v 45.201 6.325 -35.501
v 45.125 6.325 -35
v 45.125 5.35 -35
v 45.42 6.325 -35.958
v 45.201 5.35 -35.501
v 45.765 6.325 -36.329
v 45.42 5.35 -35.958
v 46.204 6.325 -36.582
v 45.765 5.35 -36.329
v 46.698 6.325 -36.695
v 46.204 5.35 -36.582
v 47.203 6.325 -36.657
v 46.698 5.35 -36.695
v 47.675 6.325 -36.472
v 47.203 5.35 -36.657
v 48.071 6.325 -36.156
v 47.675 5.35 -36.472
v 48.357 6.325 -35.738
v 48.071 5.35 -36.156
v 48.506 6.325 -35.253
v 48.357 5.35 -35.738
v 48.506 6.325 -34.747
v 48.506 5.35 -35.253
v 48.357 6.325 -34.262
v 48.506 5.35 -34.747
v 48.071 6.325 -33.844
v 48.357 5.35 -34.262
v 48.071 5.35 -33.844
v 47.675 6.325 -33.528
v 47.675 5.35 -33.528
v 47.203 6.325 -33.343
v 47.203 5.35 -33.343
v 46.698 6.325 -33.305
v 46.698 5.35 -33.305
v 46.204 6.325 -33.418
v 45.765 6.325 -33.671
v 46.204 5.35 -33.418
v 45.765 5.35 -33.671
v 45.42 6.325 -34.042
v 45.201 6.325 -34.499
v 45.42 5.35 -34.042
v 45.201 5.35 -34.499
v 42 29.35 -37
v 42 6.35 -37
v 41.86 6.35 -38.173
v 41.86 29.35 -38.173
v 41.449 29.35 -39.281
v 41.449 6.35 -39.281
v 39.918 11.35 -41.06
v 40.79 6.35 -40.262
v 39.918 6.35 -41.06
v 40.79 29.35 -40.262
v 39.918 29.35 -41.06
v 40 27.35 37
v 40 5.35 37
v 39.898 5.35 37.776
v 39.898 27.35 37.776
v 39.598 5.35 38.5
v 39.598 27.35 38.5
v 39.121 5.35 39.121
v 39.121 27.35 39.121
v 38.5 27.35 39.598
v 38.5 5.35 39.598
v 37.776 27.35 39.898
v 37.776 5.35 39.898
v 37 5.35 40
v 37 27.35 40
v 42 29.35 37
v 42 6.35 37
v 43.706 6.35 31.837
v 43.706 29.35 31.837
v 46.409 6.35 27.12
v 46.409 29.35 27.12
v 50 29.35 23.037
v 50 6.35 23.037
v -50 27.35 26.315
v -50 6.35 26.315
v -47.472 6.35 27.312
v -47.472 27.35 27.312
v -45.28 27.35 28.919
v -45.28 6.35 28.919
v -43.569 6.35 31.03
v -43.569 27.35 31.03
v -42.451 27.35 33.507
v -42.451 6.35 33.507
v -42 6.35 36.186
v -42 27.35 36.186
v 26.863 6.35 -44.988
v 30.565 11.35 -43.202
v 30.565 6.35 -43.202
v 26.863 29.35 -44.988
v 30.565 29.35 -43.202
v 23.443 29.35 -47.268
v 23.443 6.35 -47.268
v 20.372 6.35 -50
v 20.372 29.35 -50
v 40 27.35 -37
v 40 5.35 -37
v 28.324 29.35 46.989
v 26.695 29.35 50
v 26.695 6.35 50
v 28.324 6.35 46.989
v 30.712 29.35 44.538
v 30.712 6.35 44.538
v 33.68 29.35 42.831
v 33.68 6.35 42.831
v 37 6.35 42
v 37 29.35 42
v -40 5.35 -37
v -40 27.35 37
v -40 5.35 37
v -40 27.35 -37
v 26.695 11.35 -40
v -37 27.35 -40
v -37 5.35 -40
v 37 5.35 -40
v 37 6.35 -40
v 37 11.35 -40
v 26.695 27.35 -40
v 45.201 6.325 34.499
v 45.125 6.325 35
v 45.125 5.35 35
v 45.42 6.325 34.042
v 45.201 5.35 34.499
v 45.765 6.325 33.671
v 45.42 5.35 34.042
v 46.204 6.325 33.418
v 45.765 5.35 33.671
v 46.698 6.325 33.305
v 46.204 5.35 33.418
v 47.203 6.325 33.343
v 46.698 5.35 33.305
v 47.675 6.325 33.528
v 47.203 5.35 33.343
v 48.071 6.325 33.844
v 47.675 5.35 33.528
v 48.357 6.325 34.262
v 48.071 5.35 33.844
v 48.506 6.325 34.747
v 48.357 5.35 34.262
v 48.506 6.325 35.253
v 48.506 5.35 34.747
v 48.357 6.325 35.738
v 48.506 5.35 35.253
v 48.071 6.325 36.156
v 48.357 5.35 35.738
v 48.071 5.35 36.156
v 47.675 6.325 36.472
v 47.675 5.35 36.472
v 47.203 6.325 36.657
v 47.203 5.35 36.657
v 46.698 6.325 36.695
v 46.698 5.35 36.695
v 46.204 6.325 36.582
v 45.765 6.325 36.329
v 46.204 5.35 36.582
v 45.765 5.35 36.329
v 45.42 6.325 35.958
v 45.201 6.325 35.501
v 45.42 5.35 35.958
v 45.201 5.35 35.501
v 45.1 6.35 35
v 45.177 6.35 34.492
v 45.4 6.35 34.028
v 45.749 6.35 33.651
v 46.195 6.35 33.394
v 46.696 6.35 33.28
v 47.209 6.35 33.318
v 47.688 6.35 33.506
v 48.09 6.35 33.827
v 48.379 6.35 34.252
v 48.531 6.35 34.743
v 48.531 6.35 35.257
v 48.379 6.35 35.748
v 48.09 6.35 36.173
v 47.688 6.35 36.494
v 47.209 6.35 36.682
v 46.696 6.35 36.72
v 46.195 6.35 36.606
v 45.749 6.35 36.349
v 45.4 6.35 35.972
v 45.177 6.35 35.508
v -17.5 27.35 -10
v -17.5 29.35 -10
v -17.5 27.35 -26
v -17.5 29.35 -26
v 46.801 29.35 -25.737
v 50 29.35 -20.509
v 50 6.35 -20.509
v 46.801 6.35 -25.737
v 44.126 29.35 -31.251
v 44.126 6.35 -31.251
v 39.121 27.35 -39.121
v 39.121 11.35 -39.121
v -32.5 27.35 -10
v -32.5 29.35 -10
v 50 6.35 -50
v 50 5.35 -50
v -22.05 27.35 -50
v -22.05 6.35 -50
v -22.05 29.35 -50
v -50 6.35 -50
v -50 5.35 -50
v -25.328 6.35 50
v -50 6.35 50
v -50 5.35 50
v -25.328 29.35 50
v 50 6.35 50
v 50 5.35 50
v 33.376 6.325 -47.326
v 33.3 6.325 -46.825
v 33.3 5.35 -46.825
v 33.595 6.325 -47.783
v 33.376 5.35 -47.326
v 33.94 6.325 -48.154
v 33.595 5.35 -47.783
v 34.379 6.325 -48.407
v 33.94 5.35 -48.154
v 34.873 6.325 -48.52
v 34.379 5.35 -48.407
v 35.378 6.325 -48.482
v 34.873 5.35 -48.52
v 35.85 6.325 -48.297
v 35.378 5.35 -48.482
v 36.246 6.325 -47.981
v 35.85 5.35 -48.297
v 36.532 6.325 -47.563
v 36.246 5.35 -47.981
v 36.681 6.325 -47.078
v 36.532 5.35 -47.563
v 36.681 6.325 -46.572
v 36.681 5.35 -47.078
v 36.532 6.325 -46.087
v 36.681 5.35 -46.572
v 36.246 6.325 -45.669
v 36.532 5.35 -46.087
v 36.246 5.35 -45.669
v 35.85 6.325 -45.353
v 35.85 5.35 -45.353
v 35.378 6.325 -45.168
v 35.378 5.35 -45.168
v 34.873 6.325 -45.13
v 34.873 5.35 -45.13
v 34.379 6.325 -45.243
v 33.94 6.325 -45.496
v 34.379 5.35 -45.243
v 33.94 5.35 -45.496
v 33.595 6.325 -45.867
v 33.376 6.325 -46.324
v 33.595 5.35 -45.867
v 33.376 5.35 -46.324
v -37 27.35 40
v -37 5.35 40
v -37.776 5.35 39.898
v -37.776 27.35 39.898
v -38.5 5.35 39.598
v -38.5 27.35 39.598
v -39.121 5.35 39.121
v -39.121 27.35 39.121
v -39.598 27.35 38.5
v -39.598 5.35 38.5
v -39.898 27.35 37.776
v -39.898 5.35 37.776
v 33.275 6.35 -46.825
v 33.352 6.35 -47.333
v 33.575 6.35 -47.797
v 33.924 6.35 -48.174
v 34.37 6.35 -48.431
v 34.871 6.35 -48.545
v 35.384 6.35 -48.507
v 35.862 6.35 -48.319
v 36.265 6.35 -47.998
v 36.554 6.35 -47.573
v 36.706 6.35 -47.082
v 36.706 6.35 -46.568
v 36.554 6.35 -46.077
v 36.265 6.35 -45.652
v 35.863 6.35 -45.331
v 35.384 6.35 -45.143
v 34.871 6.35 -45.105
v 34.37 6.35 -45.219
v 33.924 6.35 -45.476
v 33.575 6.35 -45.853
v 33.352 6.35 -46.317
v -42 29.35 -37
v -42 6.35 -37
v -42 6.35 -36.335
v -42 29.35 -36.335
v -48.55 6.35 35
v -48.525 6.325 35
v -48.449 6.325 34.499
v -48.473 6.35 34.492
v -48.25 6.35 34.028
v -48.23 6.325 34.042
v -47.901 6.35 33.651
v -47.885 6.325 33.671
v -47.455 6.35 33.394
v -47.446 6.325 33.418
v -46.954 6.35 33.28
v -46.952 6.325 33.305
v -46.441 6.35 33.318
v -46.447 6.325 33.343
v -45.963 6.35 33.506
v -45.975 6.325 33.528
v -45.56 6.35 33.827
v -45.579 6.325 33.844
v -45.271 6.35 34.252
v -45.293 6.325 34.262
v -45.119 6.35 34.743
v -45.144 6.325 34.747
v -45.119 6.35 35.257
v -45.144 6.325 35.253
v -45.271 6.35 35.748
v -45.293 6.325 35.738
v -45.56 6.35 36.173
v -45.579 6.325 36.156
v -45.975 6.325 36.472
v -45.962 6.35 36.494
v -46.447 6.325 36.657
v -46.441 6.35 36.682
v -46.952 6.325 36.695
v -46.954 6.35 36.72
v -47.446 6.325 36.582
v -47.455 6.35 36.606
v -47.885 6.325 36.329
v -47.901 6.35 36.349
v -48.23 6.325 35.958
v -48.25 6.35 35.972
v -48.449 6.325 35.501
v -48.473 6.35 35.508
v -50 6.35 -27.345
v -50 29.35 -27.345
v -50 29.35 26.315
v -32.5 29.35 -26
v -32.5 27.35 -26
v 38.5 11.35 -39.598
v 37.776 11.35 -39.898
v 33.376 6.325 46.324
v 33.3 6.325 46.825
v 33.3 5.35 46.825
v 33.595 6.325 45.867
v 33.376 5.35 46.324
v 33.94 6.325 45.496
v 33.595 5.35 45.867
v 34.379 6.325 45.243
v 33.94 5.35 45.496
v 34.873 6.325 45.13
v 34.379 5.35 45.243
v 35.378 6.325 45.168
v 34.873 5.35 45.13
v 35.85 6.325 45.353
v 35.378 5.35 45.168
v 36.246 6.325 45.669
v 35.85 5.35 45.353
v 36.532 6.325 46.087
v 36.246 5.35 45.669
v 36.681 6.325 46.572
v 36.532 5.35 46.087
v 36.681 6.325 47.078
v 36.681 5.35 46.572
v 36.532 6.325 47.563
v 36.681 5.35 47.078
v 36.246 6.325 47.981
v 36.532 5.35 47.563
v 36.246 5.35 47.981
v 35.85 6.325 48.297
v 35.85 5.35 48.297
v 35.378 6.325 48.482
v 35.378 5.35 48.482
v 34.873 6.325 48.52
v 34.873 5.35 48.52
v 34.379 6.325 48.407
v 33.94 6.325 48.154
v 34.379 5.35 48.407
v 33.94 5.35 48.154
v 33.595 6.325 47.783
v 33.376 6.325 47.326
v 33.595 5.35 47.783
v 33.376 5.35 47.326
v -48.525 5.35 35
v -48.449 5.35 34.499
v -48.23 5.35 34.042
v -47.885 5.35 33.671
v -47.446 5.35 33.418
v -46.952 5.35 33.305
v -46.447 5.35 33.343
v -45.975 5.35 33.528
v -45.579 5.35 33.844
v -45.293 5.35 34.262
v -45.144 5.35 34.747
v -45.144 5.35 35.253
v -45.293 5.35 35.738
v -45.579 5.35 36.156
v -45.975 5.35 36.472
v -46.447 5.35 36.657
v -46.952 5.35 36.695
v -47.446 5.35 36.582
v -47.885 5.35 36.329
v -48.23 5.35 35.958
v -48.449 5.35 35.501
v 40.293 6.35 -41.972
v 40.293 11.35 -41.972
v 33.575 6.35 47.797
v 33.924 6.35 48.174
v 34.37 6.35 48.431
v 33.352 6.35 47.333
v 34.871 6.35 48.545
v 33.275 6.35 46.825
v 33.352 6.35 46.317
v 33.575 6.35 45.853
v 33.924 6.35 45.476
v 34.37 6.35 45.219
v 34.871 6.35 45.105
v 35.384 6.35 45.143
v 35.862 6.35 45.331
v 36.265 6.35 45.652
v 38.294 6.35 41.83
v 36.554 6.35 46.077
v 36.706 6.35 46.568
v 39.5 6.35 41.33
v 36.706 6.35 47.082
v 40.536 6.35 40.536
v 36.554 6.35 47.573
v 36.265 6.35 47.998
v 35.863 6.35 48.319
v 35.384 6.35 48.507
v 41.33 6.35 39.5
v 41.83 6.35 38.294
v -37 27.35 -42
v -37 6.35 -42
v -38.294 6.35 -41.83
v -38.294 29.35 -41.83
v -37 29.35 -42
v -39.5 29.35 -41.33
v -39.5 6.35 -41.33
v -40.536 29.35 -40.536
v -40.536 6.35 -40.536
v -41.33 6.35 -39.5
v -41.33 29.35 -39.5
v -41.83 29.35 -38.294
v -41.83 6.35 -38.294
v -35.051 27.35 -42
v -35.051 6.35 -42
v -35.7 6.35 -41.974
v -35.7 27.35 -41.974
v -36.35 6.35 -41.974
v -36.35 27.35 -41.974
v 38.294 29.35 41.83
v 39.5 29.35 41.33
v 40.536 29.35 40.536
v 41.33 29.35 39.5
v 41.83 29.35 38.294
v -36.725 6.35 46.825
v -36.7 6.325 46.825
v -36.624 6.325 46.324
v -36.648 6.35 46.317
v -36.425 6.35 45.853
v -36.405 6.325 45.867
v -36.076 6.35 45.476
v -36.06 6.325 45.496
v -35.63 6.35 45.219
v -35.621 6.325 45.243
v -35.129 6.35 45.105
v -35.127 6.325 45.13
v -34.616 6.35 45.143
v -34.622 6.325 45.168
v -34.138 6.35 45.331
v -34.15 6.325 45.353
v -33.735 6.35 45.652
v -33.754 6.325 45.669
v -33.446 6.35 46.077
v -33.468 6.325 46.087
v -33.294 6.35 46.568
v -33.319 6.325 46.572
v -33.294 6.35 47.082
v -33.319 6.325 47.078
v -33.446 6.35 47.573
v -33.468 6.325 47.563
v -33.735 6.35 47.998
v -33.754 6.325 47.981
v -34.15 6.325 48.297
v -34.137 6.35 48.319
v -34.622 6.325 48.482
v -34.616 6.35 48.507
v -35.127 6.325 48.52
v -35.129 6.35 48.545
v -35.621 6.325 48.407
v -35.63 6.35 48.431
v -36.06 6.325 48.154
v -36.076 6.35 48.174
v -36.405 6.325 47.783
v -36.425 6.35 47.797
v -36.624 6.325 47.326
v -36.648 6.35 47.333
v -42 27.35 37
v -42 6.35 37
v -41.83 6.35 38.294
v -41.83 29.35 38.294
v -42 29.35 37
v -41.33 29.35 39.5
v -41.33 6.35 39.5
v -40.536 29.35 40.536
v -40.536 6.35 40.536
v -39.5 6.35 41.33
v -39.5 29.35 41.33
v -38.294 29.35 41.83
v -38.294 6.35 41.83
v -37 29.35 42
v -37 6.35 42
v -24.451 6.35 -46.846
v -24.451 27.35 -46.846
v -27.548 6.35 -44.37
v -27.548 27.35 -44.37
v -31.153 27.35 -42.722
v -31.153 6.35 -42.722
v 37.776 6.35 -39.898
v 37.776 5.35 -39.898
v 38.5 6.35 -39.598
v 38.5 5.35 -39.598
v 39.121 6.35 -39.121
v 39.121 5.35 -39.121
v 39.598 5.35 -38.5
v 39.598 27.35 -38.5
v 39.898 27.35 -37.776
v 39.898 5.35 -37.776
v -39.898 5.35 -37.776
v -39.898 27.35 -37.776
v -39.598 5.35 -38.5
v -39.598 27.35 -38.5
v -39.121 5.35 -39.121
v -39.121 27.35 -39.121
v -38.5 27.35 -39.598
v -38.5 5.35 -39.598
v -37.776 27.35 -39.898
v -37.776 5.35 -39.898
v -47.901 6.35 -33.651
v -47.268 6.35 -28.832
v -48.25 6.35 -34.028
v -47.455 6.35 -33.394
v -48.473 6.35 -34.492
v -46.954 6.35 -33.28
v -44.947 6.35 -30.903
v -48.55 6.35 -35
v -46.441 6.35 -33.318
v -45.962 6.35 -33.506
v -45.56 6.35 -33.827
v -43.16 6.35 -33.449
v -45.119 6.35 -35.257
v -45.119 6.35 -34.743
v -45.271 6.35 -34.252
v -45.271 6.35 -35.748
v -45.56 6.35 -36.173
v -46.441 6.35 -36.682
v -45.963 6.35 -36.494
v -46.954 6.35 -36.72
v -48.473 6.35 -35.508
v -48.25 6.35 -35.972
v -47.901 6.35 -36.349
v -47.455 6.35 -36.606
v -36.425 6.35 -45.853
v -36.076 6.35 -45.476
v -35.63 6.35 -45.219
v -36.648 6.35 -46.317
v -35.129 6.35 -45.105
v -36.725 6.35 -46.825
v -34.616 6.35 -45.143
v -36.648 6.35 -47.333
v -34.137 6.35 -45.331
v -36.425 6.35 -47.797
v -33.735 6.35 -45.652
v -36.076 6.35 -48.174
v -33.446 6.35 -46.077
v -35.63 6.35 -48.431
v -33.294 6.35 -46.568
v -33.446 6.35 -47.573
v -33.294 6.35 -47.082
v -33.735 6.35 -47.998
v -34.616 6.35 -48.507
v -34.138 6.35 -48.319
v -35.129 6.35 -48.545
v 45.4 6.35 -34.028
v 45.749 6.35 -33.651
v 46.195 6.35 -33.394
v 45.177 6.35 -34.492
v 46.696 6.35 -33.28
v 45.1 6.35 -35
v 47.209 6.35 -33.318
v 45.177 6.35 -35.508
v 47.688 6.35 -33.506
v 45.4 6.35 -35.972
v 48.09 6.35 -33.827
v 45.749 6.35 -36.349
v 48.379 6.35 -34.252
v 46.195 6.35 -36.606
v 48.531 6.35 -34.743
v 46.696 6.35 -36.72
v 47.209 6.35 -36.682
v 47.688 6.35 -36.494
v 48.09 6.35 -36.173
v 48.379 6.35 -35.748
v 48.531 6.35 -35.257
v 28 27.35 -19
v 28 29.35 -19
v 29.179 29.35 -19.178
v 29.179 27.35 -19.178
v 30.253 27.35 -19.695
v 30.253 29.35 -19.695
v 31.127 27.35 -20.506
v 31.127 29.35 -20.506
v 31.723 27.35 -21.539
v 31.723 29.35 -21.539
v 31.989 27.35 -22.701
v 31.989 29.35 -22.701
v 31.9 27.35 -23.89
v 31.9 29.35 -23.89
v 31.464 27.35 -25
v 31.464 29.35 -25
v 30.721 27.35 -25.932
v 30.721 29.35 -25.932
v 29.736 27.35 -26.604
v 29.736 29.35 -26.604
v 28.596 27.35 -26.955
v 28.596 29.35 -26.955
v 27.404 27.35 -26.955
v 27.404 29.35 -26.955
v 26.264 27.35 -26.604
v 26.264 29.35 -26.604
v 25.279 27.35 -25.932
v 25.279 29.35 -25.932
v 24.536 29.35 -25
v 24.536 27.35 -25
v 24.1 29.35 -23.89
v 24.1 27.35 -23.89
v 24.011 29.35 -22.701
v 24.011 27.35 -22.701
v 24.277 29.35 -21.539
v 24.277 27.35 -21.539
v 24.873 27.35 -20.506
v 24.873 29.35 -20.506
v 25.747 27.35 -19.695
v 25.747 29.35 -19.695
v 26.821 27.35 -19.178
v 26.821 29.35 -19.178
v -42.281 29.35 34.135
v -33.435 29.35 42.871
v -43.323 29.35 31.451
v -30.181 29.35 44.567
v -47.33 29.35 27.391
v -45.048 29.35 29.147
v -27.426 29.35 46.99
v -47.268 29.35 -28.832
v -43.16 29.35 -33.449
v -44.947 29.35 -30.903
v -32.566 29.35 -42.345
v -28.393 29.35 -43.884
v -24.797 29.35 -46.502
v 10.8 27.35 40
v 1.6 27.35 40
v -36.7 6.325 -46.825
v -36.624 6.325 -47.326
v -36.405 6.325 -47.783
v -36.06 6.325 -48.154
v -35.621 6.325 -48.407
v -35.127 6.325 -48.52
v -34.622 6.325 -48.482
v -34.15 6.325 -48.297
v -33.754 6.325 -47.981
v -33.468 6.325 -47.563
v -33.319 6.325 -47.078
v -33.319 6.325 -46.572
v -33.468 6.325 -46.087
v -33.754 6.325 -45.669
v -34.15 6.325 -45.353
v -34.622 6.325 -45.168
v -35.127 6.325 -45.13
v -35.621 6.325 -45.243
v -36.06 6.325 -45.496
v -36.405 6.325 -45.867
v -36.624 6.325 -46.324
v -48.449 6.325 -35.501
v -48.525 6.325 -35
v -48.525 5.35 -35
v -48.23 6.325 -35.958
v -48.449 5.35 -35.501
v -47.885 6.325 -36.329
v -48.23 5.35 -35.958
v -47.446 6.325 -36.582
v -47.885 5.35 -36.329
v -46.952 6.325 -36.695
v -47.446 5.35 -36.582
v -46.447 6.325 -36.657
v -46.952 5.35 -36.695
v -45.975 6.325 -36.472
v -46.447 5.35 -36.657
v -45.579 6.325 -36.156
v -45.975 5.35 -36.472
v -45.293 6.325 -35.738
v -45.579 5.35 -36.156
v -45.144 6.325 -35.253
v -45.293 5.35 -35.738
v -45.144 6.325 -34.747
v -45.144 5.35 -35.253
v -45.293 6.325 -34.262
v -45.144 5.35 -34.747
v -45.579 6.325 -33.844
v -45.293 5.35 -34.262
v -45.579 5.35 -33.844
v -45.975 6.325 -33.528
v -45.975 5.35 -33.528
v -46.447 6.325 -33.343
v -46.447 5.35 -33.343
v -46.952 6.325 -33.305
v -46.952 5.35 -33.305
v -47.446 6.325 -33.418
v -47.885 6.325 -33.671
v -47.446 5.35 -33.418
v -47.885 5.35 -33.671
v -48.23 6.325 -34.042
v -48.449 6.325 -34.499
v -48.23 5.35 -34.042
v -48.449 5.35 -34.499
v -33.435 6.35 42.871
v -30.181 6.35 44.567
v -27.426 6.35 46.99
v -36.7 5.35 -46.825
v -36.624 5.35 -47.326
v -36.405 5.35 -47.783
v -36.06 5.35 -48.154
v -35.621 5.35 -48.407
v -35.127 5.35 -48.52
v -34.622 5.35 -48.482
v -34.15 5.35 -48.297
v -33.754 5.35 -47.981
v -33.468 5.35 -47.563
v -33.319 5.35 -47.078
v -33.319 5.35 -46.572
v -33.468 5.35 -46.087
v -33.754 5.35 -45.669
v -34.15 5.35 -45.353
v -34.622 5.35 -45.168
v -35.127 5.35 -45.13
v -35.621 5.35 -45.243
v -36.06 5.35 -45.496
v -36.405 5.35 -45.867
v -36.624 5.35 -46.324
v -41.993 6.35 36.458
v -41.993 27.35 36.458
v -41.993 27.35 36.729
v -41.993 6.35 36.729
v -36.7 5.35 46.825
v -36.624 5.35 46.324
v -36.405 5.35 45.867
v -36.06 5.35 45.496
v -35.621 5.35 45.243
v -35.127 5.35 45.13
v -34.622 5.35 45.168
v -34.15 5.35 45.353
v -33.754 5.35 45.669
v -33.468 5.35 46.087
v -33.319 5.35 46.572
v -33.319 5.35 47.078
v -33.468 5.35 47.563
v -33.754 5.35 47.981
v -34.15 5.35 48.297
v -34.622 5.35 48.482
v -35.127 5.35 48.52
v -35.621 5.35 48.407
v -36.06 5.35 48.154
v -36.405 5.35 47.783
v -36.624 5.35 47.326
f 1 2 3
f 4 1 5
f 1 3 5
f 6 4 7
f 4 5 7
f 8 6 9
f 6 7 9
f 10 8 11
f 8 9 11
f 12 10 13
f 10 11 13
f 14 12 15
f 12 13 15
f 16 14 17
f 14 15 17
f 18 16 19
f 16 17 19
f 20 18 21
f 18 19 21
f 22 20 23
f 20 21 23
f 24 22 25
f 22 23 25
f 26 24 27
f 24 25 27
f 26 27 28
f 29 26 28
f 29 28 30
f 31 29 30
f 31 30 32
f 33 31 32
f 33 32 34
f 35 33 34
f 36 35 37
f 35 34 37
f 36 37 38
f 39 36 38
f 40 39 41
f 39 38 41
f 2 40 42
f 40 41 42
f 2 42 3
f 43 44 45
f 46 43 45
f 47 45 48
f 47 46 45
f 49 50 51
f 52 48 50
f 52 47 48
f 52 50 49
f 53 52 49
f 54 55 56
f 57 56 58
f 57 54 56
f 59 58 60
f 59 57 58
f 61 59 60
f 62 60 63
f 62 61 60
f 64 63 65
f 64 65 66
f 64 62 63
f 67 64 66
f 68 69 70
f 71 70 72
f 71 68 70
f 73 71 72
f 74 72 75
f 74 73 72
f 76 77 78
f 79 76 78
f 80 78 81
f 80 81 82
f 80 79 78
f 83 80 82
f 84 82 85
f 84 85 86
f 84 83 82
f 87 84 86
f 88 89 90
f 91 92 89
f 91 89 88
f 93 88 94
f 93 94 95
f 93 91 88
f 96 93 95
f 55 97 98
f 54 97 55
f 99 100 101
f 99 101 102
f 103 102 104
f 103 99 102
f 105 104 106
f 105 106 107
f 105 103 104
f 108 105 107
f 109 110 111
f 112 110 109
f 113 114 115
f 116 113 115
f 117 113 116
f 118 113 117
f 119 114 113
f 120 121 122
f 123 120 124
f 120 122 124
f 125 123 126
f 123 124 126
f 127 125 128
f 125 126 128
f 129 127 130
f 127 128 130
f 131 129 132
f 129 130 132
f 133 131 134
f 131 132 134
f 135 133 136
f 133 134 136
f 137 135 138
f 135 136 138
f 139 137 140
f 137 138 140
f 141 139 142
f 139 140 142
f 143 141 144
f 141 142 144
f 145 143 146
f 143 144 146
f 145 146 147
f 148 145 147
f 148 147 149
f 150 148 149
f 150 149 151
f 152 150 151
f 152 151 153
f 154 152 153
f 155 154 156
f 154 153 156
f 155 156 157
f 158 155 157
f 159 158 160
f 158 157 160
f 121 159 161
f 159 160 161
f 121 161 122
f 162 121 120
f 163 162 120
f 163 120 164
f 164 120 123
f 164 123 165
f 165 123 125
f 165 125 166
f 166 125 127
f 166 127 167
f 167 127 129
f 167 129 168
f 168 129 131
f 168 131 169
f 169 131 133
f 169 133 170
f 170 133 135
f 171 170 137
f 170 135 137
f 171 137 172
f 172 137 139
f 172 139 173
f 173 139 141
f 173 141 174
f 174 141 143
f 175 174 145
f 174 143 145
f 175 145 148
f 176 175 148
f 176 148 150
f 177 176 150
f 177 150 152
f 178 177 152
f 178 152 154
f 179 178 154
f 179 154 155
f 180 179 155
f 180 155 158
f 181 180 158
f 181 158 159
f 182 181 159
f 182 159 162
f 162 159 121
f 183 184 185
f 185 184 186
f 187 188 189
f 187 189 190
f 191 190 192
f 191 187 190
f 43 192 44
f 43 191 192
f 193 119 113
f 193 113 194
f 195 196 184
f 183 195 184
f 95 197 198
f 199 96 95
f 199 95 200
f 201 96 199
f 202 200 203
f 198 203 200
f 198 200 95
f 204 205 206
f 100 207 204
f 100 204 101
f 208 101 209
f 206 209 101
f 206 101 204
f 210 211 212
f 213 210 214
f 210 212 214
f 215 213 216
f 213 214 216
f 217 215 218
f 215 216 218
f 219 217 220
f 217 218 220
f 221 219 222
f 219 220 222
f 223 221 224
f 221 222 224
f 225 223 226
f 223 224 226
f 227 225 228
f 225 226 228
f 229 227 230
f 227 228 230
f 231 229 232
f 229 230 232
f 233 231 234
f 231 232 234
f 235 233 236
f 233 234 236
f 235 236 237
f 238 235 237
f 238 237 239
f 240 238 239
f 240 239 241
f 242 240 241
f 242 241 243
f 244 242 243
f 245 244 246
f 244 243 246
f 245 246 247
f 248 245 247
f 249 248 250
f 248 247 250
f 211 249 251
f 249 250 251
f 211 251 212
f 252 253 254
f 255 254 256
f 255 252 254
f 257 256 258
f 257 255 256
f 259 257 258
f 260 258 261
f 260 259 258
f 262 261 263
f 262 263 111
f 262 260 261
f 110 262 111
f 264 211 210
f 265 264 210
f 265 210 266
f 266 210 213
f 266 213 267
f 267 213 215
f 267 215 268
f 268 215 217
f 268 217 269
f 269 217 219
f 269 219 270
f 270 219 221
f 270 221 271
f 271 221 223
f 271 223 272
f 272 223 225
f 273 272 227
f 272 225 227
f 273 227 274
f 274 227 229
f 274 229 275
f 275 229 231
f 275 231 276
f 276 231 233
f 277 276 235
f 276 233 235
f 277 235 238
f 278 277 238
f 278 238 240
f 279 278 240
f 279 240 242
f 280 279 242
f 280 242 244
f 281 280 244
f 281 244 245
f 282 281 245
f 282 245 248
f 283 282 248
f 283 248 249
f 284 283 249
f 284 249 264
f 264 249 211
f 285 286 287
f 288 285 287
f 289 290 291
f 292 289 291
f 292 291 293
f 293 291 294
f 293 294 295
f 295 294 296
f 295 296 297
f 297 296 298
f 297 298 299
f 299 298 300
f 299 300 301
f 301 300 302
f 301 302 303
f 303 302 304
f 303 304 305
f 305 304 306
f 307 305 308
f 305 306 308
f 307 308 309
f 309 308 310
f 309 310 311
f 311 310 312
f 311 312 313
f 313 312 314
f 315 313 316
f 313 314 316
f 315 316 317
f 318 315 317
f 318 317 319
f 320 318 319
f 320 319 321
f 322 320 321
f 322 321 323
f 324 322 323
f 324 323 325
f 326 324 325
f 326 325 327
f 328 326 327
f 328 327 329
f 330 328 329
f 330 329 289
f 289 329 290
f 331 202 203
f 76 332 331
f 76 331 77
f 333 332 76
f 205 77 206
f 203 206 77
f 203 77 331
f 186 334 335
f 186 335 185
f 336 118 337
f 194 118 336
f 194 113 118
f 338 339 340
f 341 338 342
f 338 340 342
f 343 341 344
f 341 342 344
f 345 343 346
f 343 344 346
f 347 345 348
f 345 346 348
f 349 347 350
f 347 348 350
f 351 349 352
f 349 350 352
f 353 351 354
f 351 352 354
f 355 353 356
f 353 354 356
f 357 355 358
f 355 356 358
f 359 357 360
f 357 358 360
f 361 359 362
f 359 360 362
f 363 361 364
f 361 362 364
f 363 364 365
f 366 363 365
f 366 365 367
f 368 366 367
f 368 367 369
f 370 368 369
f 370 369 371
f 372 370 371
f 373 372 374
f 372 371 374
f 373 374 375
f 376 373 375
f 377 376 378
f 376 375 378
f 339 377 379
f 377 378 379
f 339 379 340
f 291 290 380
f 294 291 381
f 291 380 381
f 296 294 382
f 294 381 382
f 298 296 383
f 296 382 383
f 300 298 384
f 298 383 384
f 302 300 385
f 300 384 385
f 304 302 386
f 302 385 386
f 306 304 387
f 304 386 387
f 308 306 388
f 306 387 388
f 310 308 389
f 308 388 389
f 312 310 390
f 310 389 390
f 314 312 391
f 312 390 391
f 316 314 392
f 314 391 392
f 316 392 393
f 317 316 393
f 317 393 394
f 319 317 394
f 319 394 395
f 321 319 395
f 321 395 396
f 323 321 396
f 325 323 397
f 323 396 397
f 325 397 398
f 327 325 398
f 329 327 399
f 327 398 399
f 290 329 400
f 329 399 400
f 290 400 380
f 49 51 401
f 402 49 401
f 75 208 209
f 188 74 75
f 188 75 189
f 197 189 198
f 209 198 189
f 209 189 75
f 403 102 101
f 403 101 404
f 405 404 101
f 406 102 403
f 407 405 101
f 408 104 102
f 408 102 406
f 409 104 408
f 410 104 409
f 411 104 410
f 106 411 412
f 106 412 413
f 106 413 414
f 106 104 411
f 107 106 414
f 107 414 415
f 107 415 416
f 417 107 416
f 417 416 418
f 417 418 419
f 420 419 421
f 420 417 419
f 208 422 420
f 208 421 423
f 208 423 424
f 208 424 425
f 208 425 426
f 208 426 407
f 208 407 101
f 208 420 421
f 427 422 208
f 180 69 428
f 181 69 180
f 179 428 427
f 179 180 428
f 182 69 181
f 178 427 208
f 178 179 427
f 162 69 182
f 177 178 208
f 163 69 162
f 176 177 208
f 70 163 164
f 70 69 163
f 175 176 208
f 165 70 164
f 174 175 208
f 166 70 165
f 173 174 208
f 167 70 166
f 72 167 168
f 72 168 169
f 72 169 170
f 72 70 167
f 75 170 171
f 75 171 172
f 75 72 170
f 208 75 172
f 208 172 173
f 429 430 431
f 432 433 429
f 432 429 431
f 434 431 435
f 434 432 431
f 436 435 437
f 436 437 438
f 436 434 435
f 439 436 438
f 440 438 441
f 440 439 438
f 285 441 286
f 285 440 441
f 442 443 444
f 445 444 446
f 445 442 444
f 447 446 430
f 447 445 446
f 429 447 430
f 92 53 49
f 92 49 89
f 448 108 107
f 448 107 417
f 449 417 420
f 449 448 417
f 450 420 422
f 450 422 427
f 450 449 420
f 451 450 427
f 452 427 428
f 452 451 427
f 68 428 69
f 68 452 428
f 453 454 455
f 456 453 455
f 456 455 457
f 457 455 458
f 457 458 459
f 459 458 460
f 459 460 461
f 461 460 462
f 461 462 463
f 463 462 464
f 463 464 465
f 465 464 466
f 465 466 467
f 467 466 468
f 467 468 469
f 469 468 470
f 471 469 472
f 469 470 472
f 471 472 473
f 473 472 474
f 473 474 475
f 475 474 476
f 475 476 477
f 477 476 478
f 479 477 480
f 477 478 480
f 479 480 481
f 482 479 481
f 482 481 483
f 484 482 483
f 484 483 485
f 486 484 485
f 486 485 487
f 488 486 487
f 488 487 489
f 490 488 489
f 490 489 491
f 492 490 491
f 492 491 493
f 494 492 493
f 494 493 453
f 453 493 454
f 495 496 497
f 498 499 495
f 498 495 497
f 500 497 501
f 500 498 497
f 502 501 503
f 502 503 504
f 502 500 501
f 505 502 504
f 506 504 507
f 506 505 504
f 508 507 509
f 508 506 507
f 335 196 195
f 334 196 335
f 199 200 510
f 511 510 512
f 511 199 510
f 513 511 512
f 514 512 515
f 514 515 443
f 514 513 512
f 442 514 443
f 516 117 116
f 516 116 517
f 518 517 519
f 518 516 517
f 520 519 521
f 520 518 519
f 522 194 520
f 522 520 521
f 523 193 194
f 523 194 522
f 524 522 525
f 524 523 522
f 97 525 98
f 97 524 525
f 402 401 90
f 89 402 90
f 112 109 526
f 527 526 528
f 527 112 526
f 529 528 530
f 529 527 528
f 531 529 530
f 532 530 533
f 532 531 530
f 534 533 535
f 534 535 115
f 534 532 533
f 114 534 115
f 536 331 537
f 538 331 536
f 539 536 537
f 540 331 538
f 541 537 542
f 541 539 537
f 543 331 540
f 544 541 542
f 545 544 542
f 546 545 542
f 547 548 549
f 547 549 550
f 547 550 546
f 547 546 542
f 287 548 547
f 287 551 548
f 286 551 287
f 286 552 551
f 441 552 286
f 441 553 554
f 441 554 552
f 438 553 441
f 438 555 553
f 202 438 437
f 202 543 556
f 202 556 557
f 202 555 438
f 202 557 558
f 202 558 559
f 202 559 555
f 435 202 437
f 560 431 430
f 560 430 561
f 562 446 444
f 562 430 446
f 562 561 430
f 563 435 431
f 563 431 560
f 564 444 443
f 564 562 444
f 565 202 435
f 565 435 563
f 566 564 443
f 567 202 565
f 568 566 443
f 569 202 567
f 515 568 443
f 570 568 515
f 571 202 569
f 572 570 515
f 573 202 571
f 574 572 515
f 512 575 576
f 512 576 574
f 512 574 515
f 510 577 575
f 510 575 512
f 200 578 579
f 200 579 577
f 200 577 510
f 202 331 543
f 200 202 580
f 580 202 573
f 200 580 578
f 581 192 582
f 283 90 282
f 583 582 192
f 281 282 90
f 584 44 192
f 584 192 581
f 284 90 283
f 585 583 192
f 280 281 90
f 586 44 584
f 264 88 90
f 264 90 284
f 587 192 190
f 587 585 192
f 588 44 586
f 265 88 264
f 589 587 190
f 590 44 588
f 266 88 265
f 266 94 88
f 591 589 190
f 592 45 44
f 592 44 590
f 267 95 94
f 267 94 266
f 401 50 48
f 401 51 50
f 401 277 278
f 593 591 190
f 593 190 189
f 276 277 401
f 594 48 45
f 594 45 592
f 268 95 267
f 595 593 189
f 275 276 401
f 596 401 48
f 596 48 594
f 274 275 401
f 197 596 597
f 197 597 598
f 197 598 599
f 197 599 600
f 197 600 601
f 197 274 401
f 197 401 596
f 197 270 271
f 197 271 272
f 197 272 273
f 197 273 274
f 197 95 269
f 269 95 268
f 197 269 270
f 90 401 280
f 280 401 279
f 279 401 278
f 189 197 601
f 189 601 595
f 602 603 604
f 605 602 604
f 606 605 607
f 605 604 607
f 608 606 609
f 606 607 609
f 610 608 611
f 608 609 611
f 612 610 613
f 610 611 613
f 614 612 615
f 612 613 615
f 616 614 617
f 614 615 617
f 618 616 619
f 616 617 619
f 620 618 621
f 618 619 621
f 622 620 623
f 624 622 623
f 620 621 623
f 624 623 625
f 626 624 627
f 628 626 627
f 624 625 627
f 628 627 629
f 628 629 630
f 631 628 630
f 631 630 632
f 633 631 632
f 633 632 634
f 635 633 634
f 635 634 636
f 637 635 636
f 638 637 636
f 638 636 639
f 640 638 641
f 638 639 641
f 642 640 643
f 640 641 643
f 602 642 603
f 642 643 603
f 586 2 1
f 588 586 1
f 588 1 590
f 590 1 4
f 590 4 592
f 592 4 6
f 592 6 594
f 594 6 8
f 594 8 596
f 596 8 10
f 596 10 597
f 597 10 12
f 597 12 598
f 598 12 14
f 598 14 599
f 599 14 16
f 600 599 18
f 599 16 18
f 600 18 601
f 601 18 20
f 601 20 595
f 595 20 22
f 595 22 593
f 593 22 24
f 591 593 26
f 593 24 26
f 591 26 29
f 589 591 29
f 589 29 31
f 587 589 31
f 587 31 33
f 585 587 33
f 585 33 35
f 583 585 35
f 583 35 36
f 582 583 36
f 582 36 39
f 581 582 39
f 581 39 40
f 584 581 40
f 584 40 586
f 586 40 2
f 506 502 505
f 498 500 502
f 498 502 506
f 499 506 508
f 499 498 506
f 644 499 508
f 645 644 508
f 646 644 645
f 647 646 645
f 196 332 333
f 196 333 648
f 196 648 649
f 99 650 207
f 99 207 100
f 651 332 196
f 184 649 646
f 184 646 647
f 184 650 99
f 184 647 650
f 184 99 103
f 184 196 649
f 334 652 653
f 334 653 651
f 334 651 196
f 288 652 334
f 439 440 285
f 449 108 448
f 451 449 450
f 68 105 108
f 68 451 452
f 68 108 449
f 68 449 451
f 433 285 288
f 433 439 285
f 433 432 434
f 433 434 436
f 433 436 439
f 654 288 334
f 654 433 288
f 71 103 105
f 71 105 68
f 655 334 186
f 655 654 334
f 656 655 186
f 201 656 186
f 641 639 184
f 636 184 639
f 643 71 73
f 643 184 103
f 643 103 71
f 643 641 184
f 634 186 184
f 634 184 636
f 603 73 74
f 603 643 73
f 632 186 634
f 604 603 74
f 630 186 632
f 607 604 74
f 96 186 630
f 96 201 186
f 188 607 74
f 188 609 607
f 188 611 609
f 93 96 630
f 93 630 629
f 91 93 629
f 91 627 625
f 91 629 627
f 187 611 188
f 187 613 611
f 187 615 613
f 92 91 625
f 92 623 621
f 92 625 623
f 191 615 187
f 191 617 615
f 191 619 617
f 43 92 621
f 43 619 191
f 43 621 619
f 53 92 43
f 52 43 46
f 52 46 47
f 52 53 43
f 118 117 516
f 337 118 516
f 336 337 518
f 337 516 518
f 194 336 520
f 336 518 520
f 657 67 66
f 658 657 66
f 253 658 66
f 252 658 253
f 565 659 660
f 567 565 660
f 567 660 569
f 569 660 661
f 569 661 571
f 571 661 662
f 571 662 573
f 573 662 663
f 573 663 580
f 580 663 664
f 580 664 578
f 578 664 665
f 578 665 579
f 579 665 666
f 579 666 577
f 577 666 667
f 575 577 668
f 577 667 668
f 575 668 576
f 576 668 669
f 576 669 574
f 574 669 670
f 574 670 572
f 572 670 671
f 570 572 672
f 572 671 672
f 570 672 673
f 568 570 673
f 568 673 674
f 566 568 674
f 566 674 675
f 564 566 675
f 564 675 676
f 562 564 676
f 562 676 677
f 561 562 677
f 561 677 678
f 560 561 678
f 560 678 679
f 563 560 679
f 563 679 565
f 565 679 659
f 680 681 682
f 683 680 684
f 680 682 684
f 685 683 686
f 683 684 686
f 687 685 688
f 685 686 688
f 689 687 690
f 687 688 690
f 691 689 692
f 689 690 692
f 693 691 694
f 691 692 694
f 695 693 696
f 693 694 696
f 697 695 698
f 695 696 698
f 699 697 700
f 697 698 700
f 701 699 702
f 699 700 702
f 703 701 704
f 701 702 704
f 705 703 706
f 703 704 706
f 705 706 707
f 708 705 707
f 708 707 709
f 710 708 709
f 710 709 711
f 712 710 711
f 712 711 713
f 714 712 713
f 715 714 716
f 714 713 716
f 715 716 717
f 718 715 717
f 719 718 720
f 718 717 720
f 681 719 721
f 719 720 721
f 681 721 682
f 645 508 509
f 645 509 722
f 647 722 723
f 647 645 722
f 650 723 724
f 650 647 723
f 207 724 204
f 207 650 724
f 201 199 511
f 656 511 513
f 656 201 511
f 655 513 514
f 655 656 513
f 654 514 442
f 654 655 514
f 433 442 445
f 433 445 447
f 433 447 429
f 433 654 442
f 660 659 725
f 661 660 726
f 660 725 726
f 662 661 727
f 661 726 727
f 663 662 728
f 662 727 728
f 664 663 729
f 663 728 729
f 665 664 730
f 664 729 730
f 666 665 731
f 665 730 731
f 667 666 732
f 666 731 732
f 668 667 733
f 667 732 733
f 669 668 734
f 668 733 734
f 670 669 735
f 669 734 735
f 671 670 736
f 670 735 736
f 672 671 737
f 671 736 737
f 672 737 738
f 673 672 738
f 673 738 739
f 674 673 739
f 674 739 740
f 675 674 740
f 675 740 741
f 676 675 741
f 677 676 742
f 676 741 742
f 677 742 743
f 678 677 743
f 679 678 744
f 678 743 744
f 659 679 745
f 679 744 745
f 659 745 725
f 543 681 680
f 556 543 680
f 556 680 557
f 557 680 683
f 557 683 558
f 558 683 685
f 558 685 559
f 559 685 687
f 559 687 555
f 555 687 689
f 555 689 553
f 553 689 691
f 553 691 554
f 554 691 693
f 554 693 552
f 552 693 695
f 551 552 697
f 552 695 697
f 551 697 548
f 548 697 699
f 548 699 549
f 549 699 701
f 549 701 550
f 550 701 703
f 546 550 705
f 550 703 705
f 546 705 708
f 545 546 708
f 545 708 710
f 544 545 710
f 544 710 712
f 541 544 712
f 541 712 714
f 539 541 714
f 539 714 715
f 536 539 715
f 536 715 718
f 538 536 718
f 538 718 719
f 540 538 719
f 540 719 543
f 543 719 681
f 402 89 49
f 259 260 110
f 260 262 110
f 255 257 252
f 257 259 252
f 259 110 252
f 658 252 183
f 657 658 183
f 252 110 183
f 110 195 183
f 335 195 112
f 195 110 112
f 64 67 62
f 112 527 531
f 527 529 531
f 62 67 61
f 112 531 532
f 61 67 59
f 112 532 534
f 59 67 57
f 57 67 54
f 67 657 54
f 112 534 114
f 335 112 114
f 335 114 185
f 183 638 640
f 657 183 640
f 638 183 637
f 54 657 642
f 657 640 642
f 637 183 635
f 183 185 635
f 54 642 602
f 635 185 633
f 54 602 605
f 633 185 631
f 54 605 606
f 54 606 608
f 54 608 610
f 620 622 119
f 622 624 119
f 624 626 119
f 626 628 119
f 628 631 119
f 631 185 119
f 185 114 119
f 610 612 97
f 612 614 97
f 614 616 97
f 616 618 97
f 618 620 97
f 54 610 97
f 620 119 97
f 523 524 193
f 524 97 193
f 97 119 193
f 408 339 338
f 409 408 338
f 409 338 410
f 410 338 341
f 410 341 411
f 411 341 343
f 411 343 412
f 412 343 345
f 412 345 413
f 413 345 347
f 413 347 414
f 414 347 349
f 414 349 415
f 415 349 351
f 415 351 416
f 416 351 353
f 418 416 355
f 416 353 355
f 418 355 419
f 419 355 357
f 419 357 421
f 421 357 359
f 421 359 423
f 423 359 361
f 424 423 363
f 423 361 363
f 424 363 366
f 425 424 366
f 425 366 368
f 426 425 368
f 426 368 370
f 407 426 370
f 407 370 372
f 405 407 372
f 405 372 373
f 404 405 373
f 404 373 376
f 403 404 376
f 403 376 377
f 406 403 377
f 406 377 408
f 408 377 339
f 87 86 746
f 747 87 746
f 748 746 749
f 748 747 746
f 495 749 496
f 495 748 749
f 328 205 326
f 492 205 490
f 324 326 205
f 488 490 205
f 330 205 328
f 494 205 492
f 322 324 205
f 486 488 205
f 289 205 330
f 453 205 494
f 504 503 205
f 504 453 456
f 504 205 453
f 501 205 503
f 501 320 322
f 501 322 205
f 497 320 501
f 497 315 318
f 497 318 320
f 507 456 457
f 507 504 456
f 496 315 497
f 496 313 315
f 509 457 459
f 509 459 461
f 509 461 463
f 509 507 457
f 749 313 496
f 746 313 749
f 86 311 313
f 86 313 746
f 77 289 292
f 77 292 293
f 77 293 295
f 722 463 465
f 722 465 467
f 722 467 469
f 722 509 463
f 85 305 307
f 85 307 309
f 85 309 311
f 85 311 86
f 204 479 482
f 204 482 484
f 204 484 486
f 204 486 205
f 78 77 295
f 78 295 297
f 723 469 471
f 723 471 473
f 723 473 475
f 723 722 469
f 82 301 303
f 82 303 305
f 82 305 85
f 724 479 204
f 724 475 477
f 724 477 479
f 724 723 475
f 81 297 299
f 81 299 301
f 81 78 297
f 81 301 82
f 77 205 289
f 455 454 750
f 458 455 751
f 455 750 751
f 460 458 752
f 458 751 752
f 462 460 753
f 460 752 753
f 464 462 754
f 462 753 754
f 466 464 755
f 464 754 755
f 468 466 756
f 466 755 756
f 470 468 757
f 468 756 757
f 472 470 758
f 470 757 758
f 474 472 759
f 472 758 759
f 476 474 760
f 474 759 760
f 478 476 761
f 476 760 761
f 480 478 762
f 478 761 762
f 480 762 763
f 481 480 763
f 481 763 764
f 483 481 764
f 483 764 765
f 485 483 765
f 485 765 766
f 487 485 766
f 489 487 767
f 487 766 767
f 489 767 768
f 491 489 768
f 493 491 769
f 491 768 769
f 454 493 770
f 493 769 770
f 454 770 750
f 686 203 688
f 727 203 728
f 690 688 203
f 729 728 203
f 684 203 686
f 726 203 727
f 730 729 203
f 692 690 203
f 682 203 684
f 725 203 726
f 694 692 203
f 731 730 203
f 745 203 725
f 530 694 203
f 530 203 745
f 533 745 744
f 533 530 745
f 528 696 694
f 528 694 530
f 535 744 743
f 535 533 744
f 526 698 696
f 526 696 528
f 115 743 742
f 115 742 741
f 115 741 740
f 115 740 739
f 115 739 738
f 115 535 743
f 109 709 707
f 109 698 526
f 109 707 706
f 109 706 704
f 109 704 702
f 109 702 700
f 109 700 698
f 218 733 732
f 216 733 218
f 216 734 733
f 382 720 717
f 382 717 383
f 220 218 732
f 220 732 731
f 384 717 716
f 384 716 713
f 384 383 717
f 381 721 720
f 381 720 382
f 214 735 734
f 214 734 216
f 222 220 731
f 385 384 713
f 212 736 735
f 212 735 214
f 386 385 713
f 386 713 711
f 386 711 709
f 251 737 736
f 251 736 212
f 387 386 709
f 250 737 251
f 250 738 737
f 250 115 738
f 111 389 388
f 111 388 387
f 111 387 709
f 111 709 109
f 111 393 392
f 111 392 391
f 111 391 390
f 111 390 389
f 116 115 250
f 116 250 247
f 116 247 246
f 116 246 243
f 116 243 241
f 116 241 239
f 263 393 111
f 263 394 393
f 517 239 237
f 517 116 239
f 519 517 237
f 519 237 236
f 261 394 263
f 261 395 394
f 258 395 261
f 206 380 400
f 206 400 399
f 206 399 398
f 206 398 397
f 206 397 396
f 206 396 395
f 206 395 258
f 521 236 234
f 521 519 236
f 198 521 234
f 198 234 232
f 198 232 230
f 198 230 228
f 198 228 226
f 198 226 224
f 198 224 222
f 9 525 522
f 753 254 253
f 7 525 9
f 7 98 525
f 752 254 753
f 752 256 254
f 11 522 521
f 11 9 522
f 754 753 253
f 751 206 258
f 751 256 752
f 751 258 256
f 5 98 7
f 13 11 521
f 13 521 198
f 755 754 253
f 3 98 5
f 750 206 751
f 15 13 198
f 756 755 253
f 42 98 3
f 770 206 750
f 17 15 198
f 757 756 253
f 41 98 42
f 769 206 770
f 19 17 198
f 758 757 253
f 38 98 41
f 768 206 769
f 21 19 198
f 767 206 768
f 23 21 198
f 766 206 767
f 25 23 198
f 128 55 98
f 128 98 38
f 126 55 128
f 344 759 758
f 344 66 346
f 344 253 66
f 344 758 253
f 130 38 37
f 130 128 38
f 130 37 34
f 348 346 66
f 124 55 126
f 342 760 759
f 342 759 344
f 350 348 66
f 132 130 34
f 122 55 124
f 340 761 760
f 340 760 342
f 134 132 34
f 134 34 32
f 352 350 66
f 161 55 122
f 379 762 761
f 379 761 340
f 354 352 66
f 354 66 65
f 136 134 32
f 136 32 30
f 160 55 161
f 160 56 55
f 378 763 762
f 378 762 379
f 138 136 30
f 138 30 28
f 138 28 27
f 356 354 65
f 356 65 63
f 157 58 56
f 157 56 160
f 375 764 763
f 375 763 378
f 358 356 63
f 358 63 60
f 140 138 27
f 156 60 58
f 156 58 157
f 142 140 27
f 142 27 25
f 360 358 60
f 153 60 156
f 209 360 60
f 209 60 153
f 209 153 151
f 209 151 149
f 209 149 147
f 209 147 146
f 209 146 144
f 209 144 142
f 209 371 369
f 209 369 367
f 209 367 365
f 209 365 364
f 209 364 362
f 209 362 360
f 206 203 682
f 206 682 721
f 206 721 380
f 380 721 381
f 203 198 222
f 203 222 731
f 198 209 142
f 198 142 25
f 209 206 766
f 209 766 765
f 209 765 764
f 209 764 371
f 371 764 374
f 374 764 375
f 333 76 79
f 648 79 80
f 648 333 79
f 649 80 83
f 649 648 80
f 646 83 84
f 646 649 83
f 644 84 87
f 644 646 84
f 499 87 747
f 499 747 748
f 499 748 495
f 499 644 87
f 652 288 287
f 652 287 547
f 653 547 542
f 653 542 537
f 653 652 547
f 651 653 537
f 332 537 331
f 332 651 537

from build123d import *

# Parameters (mm, degrees)
SKETCH1_W                      = 100
SKETCH1_H                      = 100
BOSS_EXTRUDE3_DEPTH            = 6.35
M3_CLEARANCE_HOLE1_D           = 3.4
M3_CLEARANCE_HOLE1_CSINK_D     = 3.45
M3_CLEARANCE_HOLE1_CSINK_ANGLE = 90
CUT_EXTRUDE1_DEPTH             = 10
SKETCH20_R                     = 1.6
BOSS_EXTRUDE4_DEPTH            = 5
BOSS_EXTRUDE5_START            = 5
SKETCH21_W                     = 9.2
SKETCH21_H                     = 5.055773539
BOSS_EXTRUDE5_DEPTH            = 5
BOSS_EXTRUDE6_START            = 21
SKETCH21_3_W                   = 9.2
SKETCH21_3_H                   = 5.055773539
BOSS_EXTRUDE6_DEPTH            = 16
BOSS_EXTRUDE7_START            = 2
SKETCH22_R                     = 4
SKETCH22_W                     = 15
SKETCH22_H                     = 16
BOSS_EXTRUDE7_DEPTH            = 2
SKETCH24_W                     = 100
SKETCH24_H                     = 100
SKETCH24_R                     = 1.7
CUT_EXTRUDE2_DEPTH             = 5.35
CUT_EXTRUDE3_DEPTH             = 5


with BuildPart() as part:
    # Sketch1 → Boss-Extrude3 (new body)
    with BuildSketch(Plane(origin=(0, 0, 0), x_dir=(1, 0, 0), z_dir=(0, 1, 0))):
        Rectangle(SKETCH1_W, SKETCH1_H)
    extrude(amount=BOSS_EXTRUDE3_DEPTH)

    # M3 Clearance Hole1 (through all)
    with Locations(Plane(origin=(0, 6.35, 0), x_dir=(1, 0, 0), z_dir=(0, 1, 0))):
        with Locations((-46.825, 35), (-35, 46.825), (35, 46.825), (46.825, 35), (46.825, -35), (35, -46.825), (-35, -46.825), (-46.825, -35)):
            CounterSinkHole(M3_CLEARANCE_HOLE1_D / 2, M3_CLEARANCE_HOLE1_CSINK_D / 2, counter_sink_angle=M3_CLEARANCE_HOLE1_CSINK_ANGLE)

    # Sketch19 → Cut-Extrude1 (cut)
    with BuildSketch(Plane(origin=(0, 6.35, 0), x_dir=(1, 0, 0), z_dir=(0, 1, 0))):
        with BuildLine():
            Line((-37, -40), (37, -40))
            ThreePointArc((37, -40), (39.121320344, -39.121320344), (40, -37))
            Line((40, -37), (40, 37))
            ThreePointArc((40, 37), (39.121320344, 39.121320344), (37, 40))
            Line((37, 40), (-37, 40))
            ThreePointArc((-37, 40), (-39.121320344, 39.121320344), (-40, 37))
            Line((-40, 37), (-40, -37))
            ThreePointArc((-40, -37), (-39.121320344, -39.121320344), (-37, -40))
        make_face()
    extrude(amount=-CUT_EXTRUDE1_DEPTH, mode=Mode.SUBTRACT)

    # Sketch20 → Boss-Extrude4 (add)
    # profile 1 of 2: a face of its own
    with BuildSketch(Plane(origin=(0, 6.35, -6.35), x_dir=(1, 0, 0), z_dir=(0, -1, 0))):
        with BuildLine():
            Line((1.60040755, 36.488159347), (1.60040755, 46.35))
            Line((1.60040755, 46.35), (1.60040755, 51.405773539))
            Line((1.60040755, 51.405773539), (10.80040755, 51.405773539))
            Line((10.80040755, 51.405773539), (10.80040755, 46.35))
            Line((10.80040755, 46.35), (10.80040755, 36.488159347))
            ThreePointArc((10.80040755, 36.488159347), (6.20040755, 31.888159347), (1.60040755, 36.488159347))
        make_face()
        with Locations(Location((6.20040755, 36.488159347, 0), (0, 0, 90))):
            Circle(SKETCH20_R, mode=Mode.SUBTRACT)
    # profile 2 of 2: a face of its own
    with BuildSketch(Plane(origin=(0, 6.35, -6.35), x_dir=(1, 0, 0), z_dir=(0, -1, 0))):
        with BuildLine():
            Line((23.839549451, -18.252155571), (39.121320344, -32.771320344))
            Line((39.121320344, -32.771320344), (40.293422294, -35.621786908))
            Line((40.293422294, -35.621786908), (30.564708642, -36.851704553))
            Line((30.564708642, -36.851704553), (26.695067206, -33.65))
            Line((26.695067206, -33.65), (17.503754806, -24.92281552))
            ThreePointArc((17.503754806, -24.92281552), (17.335801876, -18.419094063), (23.839549451, -18.252155571))
        make_face()
        with Locations(Location((20.671131891, -21.586991424, 0), (0, 0, 90))):
            Circle(SKETCH20_R, mode=Mode.SUBTRACT)
    extrude(amount=-BOSS_EXTRUDE4_DEPTH)

    # Sketch21 → Boss-Extrude5 (add)
    with BuildSketch(Plane(origin=(0, 6.35, 0), x_dir=(1, 0, 0), z_dir=(0, 1, 0)).offset(BOSS_EXTRUDE5_START)):
        with BuildLine():
            Line((40, 37), (40, -37))
            ThreePointArc((40, -37), (39.121320344, -39.121320344), (37, -40))
            Line((37, -40), (10.80040755, -40))
            Line((10.80040755, -40), (10.80040755, -45.055773539))
            Line((10.80040755, -45.055773539), (1.60040755, -45.055773539))
            Line((1.60040755, -45.055773539), (1.60040755, -40))
            Line((1.60040755, -40), (-37, -40))
            ThreePointArc((-37, -40), (-39.121320344, -39.121320344), (-40, -37))
            Line((-40, -37), (-40, 37))
            ThreePointArc((-40, 37), (-39.121320344, 39.121320344), (-37, 40))
            Line((-37, 40), (26.695067206, 40))
            Line((26.695067206, 40), (30.564708642, 43.201704553))
            ThreePointArc((30.564708642, 43.201704553), (25.113568567, 46.068744386), (20.37225284, 50))
            Line((20.37225284, 50), (-22.050029616, 50))
            ThreePointArc((-22.050029616, 50), (-27.54753826, 44.370089204), (-35.050949086, 42))
            ThreePointArc((-35.050949086, 42), (-36.025474543, 41.970620085), (-37, 42))
            ThreePointArc((-37, 42), (-40.535533906, 40.535533906), (-42, 37))
            Line((-42, 37), (-42, 36.335199984))
            ThreePointArc((-42, 36.335199984), (-44.947236911, 30.903309262), (-50, 27.345047411))
            Line((-50, 27.345047411), (-50, -26.314925762))
            ThreePointArc((-50, -26.314925762), (-44.357013872, -29.919194986), (-42, -36.186453931))
            ThreePointArc((-42, -36.186453931), (-41.99219234, -36.593226965), (-42, -37))
            ThreePointArc((-42, -37), (-40.535533906, -40.535533906), (-37, -42))
            ThreePointArc((-37, -42), (-30.181405564, -44.566583152), (-25.327689408, -50))
            Line((-25.327689408, -50), (26.695067206, -50))
            ThreePointArc((26.695067206, -50), (30.712297628, -44.537683696), (37, -42))
            ThreePointArc((37, -42), (40.535533906, -40.535533906), (42, -37))
            ThreePointArc((42, -37), (44.938337838, -29.41034973), (50, -23.037265969))
            Line((50, -23.037265969), (50, 20.508785558))
            ThreePointArc((50, 20.508785558), (45.396228517, 28.461499137), (42, 37))
            ThreePointArc((42, 37), (41.449283771, 39.281200107), (39.918450428, 41.059882646))
            Line((39.918450428, 41.059882646), (39.121320344, 39.121320344))
            ThreePointArc((39.121320344, 39.121320344), (39.771638598, 38.148050297), (40, 37))
        make_face()
        Polygon((26.695067206, 40), (39.121320344, 39.121320344), (39.918450428, 41.059882646), (30.564708642, 43.201704553), align=None)
        with Locations((6.20040755, -42.52788677)):
            Rectangle(SKETCH21_W, SKETCH21_H)
    extrude(amount=-BOSS_EXTRUDE5_DEPTH)

    # Sketch21<3> → Boss-Extrude6 (add)
    with BuildSketch(Plane(origin=(0, 6.35, 0), x_dir=(1, 0, 0), z_dir=(0, 1, 0)).offset(BOSS_EXTRUDE6_START)):
        with BuildLine():
            Line((40, 37), (40, -37))
            ThreePointArc((40, -37), (39.121320344, -39.121320344), (37, -40))
            Line((37, -40), (10.80040755, -40))
            Line((10.80040755, -40), (10.80040755, -45.055773539))
            Line((10.80040755, -45.055773539), (1.60040755, -45.055773539))
            Line((1.60040755, -45.055773539), (1.60040755, -40))
            Line((1.60040755, -40), (-37, -40))
            ThreePointArc((-37, -40), (-39.121320344, -39.121320344), (-40, -37))
            Line((-40, -37), (-40, 37))
            ThreePointArc((-40, 37), (-39.121320344, 39.121320344), (-37, 40))
            Line((-37, 40), (26.695067206, 40))
            Line((26.695067206, 40), (30.564708642, 43.201704553))
            ThreePointArc((30.564708642, 43.201704553), (25.113568567, 46.068744386), (20.37225284, 50))
            Line((20.37225284, 50), (-22.050029616, 50))
            ThreePointArc((-22.050029616, 50), (-27.54753826, 44.370089204), (-35.050949086, 42))
            ThreePointArc((-35.050949086, 42), (-36.025474543, 41.970620085), (-37, 42))
            ThreePointArc((-37, 42), (-40.535533906, 40.535533906), (-42, 37))
            Line((-42, 37), (-42, 36.335199984))
            ThreePointArc((-42, 36.335199984), (-44.947236911, 30.903309262), (-50, 27.345047411))
            Line((-50, 27.345047411), (-50, -26.314925762))
            ThreePointArc((-50, -26.314925762), (-44.357013872, -29.919194986), (-42, -36.186453931))
            ThreePointArc((-42, -36.186453931), (-41.99219234, -36.593226965), (-42, -37))
            ThreePointArc((-42, -37), (-40.535533906, -40.535533906), (-37, -42))
            ThreePointArc((-37, -42), (-30.181405564, -44.566583152), (-25.327689408, -50))
            Line((-25.327689408, -50), (26.695067206, -50))
            ThreePointArc((26.695067206, -50), (30.712297628, -44.537683696), (37, -42))
            ThreePointArc((37, -42), (40.535533906, -40.535533906), (42, -37))
            ThreePointArc((42, -37), (44.938337838, -29.41034973), (50, -23.037265969))
            Line((50, -23.037265969), (50, 20.508785558))
            ThreePointArc((50, 20.508785558), (45.396228517, 28.461499137), (42, 37))
            ThreePointArc((42, 37), (41.449283771, 39.281200107), (39.918450428, 41.059882646))
            Line((39.918450428, 41.059882646), (39.121320344, 39.121320344))
            ThreePointArc((39.121320344, 39.121320344), (39.771638598, 38.148050297), (40, 37))
        make_face()
        Polygon((26.695067206, 40), (39.121320344, 39.121320344), (39.918450428, 41.059882646), (30.564708642, 43.201704553), align=None)
        with Locations((6.20040755, -42.52788677)):
            Rectangle(SKETCH21_3_W, SKETCH21_3_H)
    extrude(amount=-BOSS_EXTRUDE6_DEPTH)

    # Sketch22 → Boss-Extrude7 (add)
    with BuildSketch(Plane(origin=(0, 27.35, 0), x_dir=(1, 0, 0), z_dir=(0, 1, 0)).offset(BOSS_EXTRUDE7_START)):
        with BuildLine():
            Line((-42, 37), (-42, 36.335199984))
            ThreePointArc((-42, 36.335199984), (-44.947236911, 30.903309262), (-50, 27.345047411))
            Line((-50, 27.345047411), (-50, -26.314925762))
            ThreePointArc((-50, -26.314925762), (-44.106969392, -30.24013582), (-42, -37))
            ThreePointArc((-42, -37), (-40.535533906, -40.535533906), (-37, -42))
            ThreePointArc((-37, -42), (-30.181405564, -44.566583152), (-25.327689408, -50))
            Line((-25.327689408, -50), (26.695067206, -50))
            ThreePointArc((26.695067206, -50), (30.712297628, -44.537683696), (37, -42))
            ThreePointArc((37, -42), (40.535533906, -40.535533906), (42, -37))
            ThreePointArc((42, -37), (44.938337838, -29.41034973), (50, -23.037265969))
            Line((50, -23.037265969), (50, 20.508785558))
            ThreePointArc((50, 20.508785558), (45.396228517, 28.461499137), (42, 37))
            ThreePointArc((42, 37), (41.449283771, 39.281200107), (39.918450428, 41.059882646))
            Line((39.918450428, 41.059882646), (30.564708642, 43.201704553))
            ThreePointArc((30.564708642, 43.201704553), (25.113568567, 46.068744386), (20.37225284, 50))
            Line((20.37225284, 50), (-22.050029616, 50))
            ThreePointArc((-22.050029616, 50), (-28.392914241, 43.884391256), (-37, 42))
            ThreePointArc((-37, 42), (-40.535533906, 40.535533906), (-42, 37))
        make_face()
        with Locations(Location((28, 23, 0), (0, 0, 270))):
            Circle(SKETCH22_R, mode=Mode.SUBTRACT)
        with Locations((-25, 18)):
            Rectangle(SKETCH22_W, SKETCH22_H, mode=Mode.SUBTRACT)
    extrude(amount=-BOSS_EXTRUDE7_DEPTH)

    # Sketch24 → Cut-Extrude2 (cut)
    with BuildSketch(Plane.XZ):
        Rectangle(SKETCH24_W, SKETCH24_H)
        with Locations(Location((-46.825, -35, 0), (0, 0, 90))):
            Circle(SKETCH24_R, mode=Mode.SUBTRACT)
        with Locations(Location((-35, -46.825, 0), (0, 0, 90))):
            Circle(SKETCH24_R, mode=Mode.SUBTRACT)
        with Locations(Location((35, -46.825, 0), (0, 0, 90))):
            Circle(SKETCH24_R, mode=Mode.SUBTRACT)
        with Locations(Location((46.825, -35, 0), (0, 0, 90))):
            Circle(SKETCH24_R, mode=Mode.SUBTRACT)
        with Locations(Location((46.825, 35, 0), (0, 0, 90))):
            Circle(SKETCH24_R, mode=Mode.SUBTRACT)
        with Locations(Location((35, 46.825, 0), (0, 0, 90))):
            Circle(SKETCH24_R, mode=Mode.SUBTRACT)
        with Locations(Location((-35, 46.825, 0), (0, 0, 90))):
            Circle(SKETCH24_R, mode=Mode.SUBTRACT)
        with Locations(Location((-46.825, 35, 0), (0, 0, 90))):
            Circle(SKETCH24_R, mode=Mode.SUBTRACT)
        with BuildLine():
            Line((-40, 37), (-40, -37))
            ThreePointArc((-40, -37), (-39.121320344, -39.121320344), (-37, -40))
            Line((-37, -40), (37, -40))
            ThreePointArc((37, -40), (39.121320344, -39.121320344), (40, -37))
            Line((40, -37), (40, 37))
            ThreePointArc((40, 37), (39.121320344, 39.121320344), (37, 40))
            Line((37, 40), (-37, 40))
            ThreePointArc((-37, 40), (-39.121320344, 39.121320344), (-40, 37))
        make_face(mode=Mode.SUBTRACT)
    extrude(amount=-CUT_EXTRUDE2_DEPTH, mode=Mode.SUBTRACT)

    # Sketch25 → Cut-Extrude3 (cut)
    with BuildSketch(Plane.XZ.offset(-6.35)):
        with BuildLine():
            Line((10.80040755, 40), (1.60040755, 40))
            Line((1.60040755, 40), (1.60040755, 30.138159347))
            ThreePointArc((1.60040755, 30.138159347), (6.20040755, 25.538159347), (10.80040755, 30.138159347))
            Line((10.80040755, 30.138159347), (10.80040755, 40))
        make_face()
        with BuildLine():
            Line((39.121320344, -39.121320344), (23.839549451, -24.602155571))
            ThreePointArc((23.839549451, -24.602155571), (17.335801876, -24.769094063), (17.503754806, -31.27281552))
            Line((17.503754806, -31.27281552), (26.695067206, -40))
            Line((26.695067206, -40), (37, -40))
            ThreePointArc((37, -40), (38.148050297, -39.771638598), (39.121320344, -39.121320344))
        make_face()
    extrude(amount=-CUT_EXTRUDE3_DEPTH, mode=Mode.SUBTRACT)


solid = part.part
